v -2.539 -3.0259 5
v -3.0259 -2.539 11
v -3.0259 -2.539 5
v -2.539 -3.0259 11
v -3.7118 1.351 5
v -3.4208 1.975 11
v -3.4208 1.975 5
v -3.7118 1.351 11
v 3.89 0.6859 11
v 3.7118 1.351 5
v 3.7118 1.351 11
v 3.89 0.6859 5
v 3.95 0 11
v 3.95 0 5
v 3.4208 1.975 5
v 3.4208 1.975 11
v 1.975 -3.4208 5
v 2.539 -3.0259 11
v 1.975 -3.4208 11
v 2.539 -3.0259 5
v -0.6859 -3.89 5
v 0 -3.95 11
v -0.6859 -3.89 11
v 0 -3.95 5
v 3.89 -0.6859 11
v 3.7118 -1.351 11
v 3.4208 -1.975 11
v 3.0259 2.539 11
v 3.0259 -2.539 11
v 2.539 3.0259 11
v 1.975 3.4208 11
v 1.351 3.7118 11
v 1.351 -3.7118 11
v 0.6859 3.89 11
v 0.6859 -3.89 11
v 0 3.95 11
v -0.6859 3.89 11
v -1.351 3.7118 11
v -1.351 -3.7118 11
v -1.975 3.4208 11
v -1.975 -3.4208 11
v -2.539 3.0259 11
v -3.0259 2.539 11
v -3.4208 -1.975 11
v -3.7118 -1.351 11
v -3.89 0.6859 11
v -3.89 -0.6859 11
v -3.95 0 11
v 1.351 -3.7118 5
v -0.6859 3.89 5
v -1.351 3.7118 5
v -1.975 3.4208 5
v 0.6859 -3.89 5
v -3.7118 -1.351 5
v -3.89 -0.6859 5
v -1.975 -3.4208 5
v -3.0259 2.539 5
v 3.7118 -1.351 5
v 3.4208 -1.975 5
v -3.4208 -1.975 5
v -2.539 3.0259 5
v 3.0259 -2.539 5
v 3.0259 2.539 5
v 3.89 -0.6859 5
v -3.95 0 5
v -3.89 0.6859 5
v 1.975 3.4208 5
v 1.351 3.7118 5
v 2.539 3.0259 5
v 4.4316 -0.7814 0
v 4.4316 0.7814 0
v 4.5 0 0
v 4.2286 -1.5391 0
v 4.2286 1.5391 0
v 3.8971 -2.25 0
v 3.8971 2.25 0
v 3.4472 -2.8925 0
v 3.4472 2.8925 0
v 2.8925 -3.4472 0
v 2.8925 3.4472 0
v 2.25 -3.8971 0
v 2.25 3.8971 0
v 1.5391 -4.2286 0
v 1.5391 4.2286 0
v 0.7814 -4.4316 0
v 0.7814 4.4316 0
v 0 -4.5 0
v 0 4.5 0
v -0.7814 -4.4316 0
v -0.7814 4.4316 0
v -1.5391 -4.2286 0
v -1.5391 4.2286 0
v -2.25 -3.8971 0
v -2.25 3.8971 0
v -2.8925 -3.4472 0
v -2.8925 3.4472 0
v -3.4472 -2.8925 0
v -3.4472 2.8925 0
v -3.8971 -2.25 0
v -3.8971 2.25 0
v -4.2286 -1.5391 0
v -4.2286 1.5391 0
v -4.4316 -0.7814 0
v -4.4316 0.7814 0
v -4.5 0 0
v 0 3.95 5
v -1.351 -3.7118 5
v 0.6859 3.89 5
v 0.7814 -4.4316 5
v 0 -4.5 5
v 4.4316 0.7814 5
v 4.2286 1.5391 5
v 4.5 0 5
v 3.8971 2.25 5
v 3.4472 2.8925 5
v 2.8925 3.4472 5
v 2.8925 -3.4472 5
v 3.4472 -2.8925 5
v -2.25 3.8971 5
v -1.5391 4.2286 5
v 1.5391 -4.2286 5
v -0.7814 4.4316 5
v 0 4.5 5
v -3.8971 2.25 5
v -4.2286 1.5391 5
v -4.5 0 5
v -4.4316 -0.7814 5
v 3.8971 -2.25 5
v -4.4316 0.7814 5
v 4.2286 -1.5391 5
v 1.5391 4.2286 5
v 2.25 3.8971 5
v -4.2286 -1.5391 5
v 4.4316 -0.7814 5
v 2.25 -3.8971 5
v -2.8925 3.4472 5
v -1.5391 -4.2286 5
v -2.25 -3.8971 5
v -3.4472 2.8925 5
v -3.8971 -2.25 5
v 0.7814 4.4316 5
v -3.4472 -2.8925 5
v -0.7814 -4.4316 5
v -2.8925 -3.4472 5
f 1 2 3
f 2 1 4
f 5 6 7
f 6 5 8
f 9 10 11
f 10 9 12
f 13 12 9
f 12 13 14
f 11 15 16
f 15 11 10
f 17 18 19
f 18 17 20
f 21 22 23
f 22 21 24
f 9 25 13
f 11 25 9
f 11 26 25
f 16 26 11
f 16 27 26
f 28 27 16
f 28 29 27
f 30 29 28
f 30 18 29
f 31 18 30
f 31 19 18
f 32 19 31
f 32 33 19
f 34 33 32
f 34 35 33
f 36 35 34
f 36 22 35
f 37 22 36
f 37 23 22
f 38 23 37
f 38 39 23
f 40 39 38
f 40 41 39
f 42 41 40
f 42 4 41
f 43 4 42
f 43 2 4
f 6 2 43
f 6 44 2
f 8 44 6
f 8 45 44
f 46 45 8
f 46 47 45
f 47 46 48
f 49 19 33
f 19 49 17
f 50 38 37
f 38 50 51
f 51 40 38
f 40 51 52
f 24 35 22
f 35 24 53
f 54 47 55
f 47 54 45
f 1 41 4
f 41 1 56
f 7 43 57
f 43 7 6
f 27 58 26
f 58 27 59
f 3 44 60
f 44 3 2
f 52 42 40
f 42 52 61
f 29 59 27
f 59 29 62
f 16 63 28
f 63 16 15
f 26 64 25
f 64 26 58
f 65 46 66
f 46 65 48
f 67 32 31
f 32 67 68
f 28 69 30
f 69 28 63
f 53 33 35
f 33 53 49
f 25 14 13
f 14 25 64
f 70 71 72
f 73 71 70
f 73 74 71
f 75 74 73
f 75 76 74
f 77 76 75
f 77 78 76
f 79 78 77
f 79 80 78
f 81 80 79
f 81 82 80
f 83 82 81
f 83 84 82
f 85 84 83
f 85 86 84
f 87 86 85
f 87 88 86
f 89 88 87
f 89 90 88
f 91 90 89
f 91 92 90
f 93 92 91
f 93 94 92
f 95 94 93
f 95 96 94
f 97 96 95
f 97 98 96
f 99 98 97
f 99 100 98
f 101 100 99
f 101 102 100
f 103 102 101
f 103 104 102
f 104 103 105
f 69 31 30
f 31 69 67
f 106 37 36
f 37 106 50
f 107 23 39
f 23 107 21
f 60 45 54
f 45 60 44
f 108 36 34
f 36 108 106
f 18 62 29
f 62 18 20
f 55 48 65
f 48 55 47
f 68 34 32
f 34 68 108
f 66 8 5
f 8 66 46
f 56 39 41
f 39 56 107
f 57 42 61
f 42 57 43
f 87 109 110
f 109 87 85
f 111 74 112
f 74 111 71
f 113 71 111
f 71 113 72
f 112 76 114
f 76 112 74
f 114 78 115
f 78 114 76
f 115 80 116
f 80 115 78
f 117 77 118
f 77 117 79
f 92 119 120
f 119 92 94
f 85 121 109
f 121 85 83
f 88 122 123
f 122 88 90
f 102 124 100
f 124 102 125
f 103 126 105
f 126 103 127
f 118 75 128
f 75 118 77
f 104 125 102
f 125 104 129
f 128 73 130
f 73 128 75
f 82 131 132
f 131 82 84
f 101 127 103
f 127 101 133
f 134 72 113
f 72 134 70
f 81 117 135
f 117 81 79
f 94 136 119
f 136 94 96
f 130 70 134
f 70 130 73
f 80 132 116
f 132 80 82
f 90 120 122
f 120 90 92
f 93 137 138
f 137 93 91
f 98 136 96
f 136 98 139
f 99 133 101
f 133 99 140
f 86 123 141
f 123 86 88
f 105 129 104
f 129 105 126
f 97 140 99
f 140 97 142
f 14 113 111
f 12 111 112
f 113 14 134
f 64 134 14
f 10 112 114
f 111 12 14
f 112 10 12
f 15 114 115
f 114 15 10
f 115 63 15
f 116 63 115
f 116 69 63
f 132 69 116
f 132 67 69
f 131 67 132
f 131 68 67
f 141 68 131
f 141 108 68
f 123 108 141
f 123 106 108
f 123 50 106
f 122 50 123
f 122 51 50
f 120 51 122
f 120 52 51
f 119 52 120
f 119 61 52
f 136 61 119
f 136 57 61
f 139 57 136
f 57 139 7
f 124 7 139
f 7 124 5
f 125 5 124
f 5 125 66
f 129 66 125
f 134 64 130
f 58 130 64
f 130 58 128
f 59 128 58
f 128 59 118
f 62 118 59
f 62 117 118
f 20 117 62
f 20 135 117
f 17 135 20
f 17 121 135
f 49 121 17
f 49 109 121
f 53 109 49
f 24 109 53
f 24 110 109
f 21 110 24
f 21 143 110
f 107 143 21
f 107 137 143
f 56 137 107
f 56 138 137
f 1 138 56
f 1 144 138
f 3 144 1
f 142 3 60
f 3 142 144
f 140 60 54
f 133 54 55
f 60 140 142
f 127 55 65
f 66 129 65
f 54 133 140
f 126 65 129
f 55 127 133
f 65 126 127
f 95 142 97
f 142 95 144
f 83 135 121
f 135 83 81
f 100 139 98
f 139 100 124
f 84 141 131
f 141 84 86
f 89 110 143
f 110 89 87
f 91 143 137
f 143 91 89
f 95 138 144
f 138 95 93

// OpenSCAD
    $fn=36;
    cylinder(h=12-1,d=7.9);
    cylinder(h=6-1,d=9);
